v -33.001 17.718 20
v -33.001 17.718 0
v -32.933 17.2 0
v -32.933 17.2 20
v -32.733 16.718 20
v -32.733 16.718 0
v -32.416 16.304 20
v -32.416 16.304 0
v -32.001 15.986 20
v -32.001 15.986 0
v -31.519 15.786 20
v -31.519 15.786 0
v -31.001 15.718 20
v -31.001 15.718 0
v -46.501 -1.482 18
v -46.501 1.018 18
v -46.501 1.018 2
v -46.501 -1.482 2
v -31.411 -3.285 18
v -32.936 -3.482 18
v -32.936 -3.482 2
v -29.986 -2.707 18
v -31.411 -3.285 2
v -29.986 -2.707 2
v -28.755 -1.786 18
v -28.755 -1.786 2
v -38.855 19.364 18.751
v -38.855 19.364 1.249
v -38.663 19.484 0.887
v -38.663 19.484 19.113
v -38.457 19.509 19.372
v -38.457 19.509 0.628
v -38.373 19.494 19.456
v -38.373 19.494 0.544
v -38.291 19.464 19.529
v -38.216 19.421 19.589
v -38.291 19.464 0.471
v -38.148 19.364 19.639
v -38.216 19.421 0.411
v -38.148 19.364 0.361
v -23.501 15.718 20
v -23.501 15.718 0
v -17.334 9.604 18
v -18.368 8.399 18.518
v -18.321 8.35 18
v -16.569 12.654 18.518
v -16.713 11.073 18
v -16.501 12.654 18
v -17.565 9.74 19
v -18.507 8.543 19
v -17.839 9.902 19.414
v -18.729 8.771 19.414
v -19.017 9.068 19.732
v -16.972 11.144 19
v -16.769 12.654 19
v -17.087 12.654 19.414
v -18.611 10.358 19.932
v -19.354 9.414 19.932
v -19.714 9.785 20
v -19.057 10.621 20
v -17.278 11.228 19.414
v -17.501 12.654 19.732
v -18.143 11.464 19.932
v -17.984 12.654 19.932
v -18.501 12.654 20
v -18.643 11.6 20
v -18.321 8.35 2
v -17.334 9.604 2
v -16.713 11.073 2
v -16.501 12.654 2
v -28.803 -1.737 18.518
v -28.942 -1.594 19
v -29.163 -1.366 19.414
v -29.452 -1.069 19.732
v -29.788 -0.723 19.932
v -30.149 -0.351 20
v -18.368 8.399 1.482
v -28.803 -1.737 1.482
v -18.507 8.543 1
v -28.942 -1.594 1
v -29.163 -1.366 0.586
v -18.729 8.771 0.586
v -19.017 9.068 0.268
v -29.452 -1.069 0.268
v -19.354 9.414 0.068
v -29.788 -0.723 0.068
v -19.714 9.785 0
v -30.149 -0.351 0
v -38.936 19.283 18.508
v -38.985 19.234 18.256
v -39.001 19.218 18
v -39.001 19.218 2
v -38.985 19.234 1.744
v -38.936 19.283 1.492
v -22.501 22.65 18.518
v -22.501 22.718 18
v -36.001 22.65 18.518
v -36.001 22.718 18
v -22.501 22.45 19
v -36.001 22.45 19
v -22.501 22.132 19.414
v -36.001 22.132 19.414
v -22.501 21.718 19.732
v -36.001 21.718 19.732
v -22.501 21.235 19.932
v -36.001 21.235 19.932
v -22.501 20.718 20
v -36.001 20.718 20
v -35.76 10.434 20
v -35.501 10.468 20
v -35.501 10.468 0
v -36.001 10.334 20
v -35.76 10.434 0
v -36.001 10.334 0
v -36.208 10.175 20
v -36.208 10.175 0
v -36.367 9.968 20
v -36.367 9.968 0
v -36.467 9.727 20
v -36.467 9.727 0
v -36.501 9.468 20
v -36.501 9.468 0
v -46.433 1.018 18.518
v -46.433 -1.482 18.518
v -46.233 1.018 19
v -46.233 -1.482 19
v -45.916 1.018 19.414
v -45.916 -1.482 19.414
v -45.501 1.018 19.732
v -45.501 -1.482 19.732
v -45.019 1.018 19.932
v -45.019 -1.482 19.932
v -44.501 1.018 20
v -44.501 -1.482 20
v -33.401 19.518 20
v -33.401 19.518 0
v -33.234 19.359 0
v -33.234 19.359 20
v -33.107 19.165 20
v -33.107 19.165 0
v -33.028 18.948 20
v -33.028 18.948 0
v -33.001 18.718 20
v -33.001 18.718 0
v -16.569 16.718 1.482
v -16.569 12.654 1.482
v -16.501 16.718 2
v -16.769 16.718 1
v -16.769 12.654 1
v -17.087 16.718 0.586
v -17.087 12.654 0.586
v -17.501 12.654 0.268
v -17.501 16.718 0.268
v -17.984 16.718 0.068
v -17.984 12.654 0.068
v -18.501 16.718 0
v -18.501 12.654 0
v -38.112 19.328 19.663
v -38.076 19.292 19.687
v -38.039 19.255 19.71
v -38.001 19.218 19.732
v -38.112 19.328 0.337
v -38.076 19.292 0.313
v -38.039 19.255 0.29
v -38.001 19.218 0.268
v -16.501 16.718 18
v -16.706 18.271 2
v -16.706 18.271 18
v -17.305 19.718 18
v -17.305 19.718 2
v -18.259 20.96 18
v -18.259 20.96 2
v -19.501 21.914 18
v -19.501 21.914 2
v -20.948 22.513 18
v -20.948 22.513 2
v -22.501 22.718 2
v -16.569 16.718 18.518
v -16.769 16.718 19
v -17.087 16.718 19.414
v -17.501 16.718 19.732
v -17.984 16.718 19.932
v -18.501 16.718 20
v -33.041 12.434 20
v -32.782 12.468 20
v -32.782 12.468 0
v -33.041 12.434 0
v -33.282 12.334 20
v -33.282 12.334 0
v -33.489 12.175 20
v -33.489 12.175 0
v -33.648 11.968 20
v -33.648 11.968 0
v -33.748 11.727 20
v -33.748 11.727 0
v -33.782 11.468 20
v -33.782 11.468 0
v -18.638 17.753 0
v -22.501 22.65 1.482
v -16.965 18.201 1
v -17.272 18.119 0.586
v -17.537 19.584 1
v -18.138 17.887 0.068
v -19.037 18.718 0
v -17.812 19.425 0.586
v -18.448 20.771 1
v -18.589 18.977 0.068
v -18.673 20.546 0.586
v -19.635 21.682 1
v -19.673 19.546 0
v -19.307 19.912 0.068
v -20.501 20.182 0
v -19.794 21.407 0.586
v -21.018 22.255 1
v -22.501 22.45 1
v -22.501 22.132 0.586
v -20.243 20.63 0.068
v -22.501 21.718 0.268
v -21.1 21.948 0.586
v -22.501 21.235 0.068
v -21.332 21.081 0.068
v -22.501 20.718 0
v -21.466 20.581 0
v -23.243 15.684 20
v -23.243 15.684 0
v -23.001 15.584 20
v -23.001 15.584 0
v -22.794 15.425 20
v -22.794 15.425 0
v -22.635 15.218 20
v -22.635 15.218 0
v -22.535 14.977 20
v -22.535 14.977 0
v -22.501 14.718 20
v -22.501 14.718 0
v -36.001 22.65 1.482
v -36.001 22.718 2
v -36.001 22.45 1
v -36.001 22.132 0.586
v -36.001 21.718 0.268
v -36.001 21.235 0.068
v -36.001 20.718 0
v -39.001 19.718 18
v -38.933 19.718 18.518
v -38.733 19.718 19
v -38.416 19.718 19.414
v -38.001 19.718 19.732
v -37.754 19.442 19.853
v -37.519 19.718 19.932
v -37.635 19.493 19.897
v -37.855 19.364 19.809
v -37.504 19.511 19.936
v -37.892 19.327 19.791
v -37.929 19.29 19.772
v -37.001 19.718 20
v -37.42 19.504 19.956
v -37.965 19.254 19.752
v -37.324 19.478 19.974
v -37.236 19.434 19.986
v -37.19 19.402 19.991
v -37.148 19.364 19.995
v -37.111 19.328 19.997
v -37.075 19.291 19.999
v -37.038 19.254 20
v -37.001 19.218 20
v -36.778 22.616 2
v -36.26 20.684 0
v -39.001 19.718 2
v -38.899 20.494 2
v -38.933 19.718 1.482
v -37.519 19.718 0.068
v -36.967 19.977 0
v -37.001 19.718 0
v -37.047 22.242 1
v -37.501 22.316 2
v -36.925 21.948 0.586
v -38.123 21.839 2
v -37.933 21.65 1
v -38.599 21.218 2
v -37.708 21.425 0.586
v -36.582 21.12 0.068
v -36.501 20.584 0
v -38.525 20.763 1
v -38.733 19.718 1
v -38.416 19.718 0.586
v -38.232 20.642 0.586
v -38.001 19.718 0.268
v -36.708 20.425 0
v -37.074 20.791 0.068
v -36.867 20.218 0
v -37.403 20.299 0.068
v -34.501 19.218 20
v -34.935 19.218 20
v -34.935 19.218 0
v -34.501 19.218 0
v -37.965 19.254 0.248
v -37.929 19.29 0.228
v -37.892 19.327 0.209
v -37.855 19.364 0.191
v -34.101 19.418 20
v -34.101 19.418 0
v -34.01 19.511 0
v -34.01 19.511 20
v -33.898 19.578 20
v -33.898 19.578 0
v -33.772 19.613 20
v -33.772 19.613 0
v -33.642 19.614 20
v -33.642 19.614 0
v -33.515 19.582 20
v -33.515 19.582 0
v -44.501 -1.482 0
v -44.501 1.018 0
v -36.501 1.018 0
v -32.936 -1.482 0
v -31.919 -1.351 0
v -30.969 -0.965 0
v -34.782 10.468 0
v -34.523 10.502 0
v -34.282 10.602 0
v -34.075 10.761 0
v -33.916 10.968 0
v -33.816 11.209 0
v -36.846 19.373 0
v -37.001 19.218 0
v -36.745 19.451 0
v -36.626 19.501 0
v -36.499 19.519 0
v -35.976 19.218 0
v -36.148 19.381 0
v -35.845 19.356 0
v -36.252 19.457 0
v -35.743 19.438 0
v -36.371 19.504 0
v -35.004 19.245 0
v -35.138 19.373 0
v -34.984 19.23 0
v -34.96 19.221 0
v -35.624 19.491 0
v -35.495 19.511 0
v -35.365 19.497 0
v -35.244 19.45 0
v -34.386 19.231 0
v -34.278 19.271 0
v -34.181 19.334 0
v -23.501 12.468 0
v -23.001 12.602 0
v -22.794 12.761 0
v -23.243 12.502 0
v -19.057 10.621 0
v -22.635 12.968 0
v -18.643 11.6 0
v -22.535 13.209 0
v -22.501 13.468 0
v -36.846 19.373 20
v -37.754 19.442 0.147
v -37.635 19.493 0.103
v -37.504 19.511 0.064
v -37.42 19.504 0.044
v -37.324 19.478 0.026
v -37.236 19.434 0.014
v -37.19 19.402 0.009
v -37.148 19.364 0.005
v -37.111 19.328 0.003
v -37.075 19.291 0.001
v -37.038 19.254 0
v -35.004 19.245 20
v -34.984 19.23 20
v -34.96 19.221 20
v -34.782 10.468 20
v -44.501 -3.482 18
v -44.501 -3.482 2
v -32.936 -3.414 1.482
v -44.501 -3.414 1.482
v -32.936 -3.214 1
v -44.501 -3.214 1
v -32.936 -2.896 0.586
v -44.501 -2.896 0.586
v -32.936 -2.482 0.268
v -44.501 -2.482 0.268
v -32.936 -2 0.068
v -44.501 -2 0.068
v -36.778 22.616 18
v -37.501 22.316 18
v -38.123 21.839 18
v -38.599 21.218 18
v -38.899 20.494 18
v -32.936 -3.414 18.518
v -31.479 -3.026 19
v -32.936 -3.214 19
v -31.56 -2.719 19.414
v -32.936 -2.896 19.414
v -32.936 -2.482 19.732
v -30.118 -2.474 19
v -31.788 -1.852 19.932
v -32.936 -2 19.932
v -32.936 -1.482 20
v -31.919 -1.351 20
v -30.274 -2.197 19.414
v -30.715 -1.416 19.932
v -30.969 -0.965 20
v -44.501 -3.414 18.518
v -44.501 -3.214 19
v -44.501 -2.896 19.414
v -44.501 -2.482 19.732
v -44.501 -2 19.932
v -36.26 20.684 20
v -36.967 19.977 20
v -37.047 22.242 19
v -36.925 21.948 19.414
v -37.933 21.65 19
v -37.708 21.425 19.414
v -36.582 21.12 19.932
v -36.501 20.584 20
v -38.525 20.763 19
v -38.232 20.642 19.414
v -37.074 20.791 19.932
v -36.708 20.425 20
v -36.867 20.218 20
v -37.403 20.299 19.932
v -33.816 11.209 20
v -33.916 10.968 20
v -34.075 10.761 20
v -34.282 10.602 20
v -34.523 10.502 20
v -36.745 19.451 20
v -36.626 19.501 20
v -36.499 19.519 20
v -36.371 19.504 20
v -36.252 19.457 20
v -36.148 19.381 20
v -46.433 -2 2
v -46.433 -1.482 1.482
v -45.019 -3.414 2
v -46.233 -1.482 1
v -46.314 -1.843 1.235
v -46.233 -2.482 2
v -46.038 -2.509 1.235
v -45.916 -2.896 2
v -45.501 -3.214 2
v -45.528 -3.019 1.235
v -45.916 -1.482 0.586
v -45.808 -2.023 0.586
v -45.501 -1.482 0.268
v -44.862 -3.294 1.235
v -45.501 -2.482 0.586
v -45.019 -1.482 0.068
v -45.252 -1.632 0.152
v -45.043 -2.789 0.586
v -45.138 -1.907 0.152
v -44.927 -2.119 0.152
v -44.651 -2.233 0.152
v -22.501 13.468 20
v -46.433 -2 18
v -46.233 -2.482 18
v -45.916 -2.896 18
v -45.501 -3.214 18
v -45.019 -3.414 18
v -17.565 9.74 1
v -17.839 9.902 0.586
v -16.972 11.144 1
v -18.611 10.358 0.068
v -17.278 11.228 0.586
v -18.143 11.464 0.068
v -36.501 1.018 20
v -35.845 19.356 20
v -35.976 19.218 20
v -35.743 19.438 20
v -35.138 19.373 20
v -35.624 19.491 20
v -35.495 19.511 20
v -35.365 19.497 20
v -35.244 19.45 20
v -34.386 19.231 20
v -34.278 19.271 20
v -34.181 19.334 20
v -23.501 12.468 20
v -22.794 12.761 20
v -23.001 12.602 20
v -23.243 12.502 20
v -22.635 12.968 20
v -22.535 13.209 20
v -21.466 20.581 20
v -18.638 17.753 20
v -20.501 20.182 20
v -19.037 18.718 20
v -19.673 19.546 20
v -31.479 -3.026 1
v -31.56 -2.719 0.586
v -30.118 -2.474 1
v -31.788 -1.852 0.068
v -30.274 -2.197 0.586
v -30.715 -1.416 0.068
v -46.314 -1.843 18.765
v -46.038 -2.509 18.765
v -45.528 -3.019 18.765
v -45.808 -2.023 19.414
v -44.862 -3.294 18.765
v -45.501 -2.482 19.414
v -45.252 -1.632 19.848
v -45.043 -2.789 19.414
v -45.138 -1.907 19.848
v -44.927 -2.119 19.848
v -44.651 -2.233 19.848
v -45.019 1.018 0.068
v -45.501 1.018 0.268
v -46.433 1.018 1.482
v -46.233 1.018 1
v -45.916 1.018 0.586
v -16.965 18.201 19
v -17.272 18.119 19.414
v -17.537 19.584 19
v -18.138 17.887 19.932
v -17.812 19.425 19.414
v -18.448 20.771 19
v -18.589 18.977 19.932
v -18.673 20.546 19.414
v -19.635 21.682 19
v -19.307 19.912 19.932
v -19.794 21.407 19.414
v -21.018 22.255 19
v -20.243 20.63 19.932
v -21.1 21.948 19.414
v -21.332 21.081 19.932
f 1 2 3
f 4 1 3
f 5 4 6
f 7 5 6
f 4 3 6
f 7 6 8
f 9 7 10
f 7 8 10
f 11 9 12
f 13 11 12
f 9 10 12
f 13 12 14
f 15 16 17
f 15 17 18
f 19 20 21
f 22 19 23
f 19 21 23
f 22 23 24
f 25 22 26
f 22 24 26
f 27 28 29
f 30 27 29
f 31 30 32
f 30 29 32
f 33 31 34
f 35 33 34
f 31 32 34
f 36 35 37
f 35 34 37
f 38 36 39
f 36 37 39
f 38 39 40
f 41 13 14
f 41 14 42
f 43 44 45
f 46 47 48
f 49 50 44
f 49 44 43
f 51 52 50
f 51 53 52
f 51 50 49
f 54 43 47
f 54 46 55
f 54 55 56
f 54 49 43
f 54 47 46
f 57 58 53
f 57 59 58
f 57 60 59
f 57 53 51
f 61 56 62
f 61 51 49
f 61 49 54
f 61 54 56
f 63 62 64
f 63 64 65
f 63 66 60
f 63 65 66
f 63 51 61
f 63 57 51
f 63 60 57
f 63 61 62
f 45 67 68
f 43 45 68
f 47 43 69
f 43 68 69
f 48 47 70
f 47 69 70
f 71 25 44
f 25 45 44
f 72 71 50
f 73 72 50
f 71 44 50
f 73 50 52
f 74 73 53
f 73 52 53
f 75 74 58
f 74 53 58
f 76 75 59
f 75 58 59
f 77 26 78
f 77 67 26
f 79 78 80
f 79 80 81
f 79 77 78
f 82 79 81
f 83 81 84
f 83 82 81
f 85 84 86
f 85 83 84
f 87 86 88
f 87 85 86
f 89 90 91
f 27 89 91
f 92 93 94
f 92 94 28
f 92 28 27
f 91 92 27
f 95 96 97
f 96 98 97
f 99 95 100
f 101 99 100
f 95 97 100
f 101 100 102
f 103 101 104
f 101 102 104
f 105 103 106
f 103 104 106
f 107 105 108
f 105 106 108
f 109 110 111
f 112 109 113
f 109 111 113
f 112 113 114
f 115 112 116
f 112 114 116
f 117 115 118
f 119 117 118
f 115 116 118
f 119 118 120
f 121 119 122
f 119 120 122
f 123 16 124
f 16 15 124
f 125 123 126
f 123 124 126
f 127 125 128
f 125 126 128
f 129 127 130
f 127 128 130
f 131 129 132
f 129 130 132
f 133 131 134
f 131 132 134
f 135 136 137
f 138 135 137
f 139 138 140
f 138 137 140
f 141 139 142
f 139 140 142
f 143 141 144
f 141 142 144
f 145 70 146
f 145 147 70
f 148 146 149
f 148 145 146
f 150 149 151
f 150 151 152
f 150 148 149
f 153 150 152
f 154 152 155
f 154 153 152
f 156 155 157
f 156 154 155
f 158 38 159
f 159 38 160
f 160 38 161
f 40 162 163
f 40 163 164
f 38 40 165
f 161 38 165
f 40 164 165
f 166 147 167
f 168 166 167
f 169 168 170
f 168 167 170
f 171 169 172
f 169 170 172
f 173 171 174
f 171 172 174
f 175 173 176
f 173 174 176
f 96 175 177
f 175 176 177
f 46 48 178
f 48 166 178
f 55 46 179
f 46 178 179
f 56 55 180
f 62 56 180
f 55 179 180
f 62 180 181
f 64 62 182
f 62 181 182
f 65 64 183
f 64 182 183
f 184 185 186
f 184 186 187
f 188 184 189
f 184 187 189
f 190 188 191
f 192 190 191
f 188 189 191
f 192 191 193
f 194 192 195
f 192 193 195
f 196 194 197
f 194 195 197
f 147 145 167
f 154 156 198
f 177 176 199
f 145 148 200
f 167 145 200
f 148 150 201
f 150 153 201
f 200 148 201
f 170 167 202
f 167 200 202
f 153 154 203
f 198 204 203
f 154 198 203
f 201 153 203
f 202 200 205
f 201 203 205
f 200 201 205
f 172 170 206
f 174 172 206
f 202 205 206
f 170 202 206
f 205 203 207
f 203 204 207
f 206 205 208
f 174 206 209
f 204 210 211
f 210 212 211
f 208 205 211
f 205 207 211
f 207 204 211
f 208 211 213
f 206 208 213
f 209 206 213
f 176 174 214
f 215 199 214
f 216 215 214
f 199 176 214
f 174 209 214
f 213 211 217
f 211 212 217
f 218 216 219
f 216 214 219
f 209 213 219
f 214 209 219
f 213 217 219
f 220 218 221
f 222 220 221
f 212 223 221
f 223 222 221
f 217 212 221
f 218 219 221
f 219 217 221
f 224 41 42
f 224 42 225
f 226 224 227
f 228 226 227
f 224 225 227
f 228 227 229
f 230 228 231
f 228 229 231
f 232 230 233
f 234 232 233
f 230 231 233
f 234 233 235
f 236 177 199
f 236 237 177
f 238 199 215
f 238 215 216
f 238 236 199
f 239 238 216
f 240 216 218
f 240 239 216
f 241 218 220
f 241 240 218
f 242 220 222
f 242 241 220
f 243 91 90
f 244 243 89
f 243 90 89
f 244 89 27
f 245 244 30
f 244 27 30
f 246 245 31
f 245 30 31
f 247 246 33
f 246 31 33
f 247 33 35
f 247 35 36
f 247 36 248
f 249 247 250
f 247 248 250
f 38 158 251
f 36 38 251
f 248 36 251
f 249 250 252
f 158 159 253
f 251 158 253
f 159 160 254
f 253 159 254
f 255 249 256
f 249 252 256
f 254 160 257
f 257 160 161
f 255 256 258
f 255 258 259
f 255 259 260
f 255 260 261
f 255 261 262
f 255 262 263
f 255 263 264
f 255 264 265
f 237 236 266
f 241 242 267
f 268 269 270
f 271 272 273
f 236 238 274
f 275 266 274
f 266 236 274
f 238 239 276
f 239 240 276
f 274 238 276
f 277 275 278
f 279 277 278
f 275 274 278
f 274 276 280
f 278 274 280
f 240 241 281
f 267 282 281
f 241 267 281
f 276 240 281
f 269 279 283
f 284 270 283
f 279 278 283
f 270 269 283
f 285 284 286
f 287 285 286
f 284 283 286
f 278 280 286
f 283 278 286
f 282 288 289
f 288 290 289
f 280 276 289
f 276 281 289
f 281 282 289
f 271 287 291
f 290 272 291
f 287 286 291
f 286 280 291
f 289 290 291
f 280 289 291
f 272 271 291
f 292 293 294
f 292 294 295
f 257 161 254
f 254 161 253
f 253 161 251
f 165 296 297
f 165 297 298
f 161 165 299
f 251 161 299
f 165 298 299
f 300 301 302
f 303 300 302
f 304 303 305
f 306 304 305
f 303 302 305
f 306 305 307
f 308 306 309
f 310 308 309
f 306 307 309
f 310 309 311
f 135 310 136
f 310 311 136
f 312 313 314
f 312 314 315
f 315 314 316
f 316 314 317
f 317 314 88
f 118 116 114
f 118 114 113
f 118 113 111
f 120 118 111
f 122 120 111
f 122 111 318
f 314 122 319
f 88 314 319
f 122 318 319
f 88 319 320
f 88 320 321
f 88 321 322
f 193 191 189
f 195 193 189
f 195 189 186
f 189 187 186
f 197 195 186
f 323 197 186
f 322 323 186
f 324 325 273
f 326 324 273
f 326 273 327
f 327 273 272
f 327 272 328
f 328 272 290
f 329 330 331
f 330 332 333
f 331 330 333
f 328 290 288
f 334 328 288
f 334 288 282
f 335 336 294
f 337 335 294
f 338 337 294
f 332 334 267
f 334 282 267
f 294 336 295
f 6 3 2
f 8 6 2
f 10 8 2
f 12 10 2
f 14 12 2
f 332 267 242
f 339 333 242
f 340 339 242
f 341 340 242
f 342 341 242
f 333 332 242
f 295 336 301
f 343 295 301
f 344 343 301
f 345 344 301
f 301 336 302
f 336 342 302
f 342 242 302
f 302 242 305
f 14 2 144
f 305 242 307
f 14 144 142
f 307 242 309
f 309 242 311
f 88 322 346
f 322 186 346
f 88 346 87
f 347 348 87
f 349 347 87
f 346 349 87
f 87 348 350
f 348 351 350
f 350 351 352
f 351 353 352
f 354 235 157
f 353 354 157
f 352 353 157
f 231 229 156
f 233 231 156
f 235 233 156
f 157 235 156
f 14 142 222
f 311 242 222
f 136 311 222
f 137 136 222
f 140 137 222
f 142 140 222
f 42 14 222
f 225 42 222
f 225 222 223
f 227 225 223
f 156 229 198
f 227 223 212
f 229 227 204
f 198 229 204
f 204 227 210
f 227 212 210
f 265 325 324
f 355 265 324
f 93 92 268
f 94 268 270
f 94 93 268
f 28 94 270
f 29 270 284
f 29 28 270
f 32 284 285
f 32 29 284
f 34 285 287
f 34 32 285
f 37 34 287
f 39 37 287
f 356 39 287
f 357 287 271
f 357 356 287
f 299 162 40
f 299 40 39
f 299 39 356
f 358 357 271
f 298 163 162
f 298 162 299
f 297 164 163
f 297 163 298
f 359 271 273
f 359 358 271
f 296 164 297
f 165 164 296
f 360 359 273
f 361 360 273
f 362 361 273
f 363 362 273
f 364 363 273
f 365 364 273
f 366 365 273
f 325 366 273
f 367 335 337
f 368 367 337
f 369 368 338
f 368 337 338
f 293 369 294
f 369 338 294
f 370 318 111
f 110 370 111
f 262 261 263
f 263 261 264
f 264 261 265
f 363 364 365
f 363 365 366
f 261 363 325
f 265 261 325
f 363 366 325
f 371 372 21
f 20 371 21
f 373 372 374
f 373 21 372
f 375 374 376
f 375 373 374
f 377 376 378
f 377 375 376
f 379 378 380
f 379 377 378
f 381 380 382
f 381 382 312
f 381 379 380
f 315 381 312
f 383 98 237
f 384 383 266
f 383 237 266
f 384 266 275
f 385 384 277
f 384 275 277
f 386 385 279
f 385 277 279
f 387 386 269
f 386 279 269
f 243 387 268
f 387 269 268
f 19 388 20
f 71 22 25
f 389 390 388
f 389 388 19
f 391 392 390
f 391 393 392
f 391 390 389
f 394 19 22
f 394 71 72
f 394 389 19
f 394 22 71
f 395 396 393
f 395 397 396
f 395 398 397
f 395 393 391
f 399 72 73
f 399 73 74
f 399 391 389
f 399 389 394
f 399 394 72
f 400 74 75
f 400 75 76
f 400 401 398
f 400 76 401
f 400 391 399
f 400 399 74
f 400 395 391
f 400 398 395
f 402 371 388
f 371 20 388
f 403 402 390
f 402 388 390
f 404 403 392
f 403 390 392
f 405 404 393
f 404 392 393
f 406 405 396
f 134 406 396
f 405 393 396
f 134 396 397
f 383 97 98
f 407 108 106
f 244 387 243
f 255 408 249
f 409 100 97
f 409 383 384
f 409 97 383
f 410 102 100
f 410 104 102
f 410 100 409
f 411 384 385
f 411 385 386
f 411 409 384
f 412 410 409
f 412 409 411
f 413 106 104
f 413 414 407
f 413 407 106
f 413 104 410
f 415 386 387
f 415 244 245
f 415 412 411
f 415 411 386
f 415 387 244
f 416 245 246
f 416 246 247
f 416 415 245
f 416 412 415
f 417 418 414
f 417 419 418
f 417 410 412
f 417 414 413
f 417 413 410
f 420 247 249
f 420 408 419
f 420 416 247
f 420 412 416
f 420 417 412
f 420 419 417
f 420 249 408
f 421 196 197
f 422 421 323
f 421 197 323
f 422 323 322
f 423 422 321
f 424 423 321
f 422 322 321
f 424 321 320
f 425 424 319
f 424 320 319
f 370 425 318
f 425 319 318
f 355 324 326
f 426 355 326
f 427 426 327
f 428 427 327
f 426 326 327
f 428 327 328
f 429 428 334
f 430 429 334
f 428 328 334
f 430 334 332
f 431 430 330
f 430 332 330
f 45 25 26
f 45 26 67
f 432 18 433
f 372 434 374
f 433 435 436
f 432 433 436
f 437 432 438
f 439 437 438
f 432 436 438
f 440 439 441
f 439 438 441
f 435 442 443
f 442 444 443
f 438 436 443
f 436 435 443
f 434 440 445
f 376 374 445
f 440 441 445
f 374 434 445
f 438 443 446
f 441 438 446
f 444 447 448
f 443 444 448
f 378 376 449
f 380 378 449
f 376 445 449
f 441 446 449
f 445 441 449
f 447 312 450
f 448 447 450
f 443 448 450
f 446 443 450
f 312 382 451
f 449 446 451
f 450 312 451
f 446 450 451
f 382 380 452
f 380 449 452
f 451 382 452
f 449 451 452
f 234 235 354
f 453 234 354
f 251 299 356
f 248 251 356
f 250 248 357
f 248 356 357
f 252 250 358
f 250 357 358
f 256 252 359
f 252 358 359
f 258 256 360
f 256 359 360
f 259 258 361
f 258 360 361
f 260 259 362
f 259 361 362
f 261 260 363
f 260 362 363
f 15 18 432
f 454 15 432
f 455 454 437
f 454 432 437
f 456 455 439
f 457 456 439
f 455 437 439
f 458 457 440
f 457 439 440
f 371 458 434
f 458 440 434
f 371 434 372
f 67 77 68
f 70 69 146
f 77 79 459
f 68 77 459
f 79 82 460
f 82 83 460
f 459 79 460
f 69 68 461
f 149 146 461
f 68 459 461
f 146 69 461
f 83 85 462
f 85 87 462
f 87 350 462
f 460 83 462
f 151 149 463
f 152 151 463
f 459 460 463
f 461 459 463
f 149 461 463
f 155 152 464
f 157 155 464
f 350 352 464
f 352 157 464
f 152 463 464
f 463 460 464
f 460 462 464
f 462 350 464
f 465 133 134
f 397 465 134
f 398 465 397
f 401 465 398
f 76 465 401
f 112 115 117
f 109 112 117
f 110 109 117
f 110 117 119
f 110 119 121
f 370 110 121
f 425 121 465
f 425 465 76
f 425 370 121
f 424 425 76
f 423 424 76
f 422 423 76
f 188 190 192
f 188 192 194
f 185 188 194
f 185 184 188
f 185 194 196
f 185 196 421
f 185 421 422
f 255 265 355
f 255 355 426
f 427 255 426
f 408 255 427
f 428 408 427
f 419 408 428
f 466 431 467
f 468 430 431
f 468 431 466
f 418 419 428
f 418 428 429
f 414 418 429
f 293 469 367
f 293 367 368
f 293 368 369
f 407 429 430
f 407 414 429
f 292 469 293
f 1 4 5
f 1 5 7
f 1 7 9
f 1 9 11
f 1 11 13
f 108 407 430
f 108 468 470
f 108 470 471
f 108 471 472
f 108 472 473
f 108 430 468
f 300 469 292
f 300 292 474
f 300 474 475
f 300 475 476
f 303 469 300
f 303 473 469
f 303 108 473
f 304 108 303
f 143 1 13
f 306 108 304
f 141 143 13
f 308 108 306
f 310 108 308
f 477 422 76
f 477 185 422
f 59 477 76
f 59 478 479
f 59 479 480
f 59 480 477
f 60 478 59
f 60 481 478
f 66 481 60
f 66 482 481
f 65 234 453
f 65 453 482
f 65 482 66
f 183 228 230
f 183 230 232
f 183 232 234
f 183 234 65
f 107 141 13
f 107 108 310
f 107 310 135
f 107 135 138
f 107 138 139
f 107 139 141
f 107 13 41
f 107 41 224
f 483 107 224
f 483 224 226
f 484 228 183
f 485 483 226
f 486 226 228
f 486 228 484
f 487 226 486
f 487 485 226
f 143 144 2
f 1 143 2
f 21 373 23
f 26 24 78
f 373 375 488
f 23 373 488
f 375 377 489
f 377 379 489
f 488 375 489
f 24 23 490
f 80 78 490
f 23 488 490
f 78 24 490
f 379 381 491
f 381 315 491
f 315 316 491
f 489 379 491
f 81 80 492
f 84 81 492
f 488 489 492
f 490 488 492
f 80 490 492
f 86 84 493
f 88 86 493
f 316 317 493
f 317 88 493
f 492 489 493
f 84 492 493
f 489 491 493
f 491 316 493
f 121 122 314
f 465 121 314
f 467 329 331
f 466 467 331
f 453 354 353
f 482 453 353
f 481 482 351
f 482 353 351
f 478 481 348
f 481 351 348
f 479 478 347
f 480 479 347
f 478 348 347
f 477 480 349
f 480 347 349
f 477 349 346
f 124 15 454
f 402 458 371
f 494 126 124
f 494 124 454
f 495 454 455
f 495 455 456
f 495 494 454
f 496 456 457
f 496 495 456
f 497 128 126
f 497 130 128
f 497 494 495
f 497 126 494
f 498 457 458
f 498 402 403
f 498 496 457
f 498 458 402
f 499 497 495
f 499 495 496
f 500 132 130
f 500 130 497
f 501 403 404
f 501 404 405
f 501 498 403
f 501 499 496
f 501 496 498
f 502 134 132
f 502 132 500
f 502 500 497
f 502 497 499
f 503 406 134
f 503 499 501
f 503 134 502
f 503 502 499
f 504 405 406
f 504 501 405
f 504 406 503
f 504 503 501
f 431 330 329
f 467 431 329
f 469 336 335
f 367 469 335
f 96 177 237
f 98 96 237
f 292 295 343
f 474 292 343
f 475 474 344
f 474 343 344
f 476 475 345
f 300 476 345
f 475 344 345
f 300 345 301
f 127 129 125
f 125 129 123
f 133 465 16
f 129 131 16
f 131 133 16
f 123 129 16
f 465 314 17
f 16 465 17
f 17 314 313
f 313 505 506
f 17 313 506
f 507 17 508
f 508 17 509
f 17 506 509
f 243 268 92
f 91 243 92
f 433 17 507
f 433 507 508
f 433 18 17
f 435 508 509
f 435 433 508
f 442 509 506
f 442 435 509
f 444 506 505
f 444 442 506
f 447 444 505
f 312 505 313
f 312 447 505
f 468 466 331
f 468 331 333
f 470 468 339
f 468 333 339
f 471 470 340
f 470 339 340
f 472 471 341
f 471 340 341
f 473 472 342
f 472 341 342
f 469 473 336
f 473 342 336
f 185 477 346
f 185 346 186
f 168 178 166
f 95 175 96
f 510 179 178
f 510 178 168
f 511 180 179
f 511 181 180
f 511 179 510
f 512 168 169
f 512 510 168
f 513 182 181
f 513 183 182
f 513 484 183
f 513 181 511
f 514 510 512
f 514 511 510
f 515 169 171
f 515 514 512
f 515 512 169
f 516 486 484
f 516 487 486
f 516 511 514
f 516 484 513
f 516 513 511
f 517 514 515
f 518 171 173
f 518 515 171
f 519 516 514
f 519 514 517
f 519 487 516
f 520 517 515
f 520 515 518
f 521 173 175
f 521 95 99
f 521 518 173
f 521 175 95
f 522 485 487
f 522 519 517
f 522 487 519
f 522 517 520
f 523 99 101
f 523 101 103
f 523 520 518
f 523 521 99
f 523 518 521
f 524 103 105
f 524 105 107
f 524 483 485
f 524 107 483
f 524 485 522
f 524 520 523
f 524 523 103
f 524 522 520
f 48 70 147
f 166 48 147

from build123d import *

# Parameters (mm, degrees)
F1_DEPTH = 20
F2_R     = 2


# Not quite as in the source:
# - a feature names something its author has since deleted; it is built from what else it names


with BuildPart() as f1:
    # F0 (on Top) → F1 (new body)
    with BuildSketch(Plane.XY):
        with BuildLine():
            ThreePointArc((-33.4013422072, 19.5177844279), (-33.1069150162, 19.1649980234), (-33.0013422072, 18.7177844279))
            Line((-33.0013422072, 18.7177844279), (-33.0013422072, 17.7177844279))
            ThreePointArc((-33.0013422072, 17.7177844279), (-32.4155557696, 16.3035708655), (-31.0013422072, 15.7177844279))
            Line((-31.0013422072, 15.7177844279), (-23.5013422072, 15.7177844279))
            ThreePointArc((-23.5013422072, 15.7177844279), (-22.794235426, 15.424891209), (-22.5013422072, 14.7177844279))
            Line((-22.5013422072, 14.7177844279), (-22.5013422072, 13.4677844279))
            ThreePointArc((-22.5013422072, 13.4677844279), (-22.794235426, 12.7606776467), (-23.5013422072, 12.4677844279))
            Line((-23.5013422072, 12.4677844279), (-32.781970528, 12.4677844279))
            ThreePointArc((-32.781970528, 12.4677844279), (-33.4890773091, 12.174891209), (-33.781970528, 11.4677844279))
            ThreePointArc((-33.781970528, 11.4677844279), (-34.0748637468, 10.7606776467), (-34.781970528, 10.4677844279))
            Line((-34.781970528, 10.4677844279), (-35.5013422072, 10.4677844279))
            ThreePointArc((-35.5013422072, 10.4677844279), (-36.2084489884, 10.174891209), (-36.5013422072, 9.4677844279))
            Line((-36.5013422072, 9.4677844279), (-36.5013422072, 2.9677844279))
            Line((-36.5013422072, 2.9677844279), (-36.5013422072, 1.0177844279))
            Line((-36.5013422072, 1.0177844279), (-38.5013422072, 1.0177844279))
            Line((-38.5013422072, 1.0177844279), (-46.5013422072, 1.0177844279))
            Line((-46.5013422072, 1.0177844279), (-46.5013422072, 0.5177844279))
            Line((-46.5013422072, 0.5177844279), (-46.5013422072, -1.4822155721))
            ThreePointArc((-46.5013422072, -1.4822155721), (-45.9155557696, -2.8964291345), (-44.5013422072, -3.4822155721))
            Line((-44.5013422072, -3.4822155721), (-32.935840724, -3.4822155721))
            ThreePointArc((-32.935840724, -3.4822155721), (-30.679965917, -3.0419843493), (-28.7551266184, -1.7858918573))
            Line((-28.7551266184, -1.7858918573), (-18.3206281016, 8.3504781304))
            ThreePointArc((-18.3206281016, 8.3504781304), (-16.9748476295, 10.3179485849), (-16.5013422072, 12.6541544156))
            Line((-16.5013422072, 12.6541544156), (-16.5013422072, 16.7177844279))
            ThreePointArc((-16.5013422072, 16.7177844279), (-18.2587015201, 20.960425115), (-22.5013422072, 22.7177844279))
            Line((-22.5013422072, 22.7177844279), (-36.0013422072, 22.7177844279))
            ThreePointArc((-36.0013422072, 22.7177844279), (-38.1226625508, 21.8391047714), (-39.0013422072, 19.7177844279))
            Line((-39.0013422072, 19.7177844279), (-39.0013422072, 19.2177844279))
            Line((-39.0013422072, 19.2177844279), (-38.8548955978, 19.3642310373))
            ThreePointArc((-38.8548955978, 19.3642310373), (-38.5013422072, 19.5106776467), (-38.1477888166, 19.3642310373))
            Line((-38.1477888166, 19.3642310373), (-38.0013422072, 19.2177844279))
            Line((-38.0013422072, 19.2177844279), (-37.8548955978, 19.3642310373))
            ThreePointArc((-37.8548955978, 19.3642310373), (-37.5013422072, 19.5106776467), (-37.1477888166, 19.3642310373))
            Line((-37.1477888166, 19.3642310373), (-37.0013422072, 19.2177844279))
            Line((-37.0013422072, 19.2177844279), (-36.8463774903, 19.3727491447))
            ThreePointArc((-36.8463774903, 19.3727491447), (-36.498920301, 19.5191585891), (-36.1479965135, 19.3812647196))
            Line((-36.1479965135, 19.3812647196), (-35.9763422072, 19.2177844279))
            Line((-35.9763422072, 19.2177844279), (-35.8449793172, 19.3557154623))
            ThreePointArc((-35.8449793172, 19.3557154623), (-35.4951018479, 19.5107392214), (-35.1380827655, 19.3729568416))
            Line((-35.1380827655, 19.3729568416), (-35.0041172482, 19.2453706347))
            ThreePointArc((-35.0041172482, 19.2453706347), (-34.9722907986, 19.2249367588), (-34.935151731, 19.2177844279))
            Line((-34.935151731, 19.2177844279), (-34.5013422072, 19.2177844279))
            ThreePointArc((-34.5013422072, 19.2177844279), (-34.2777354094, 19.2705708324), (-34.1013422072, 19.4177844279))
            ThreePointArc((-34.1013422072, 19.4177844279), (-33.7720528853, 19.6127591747), (-33.4013422072, 19.5177844279))
        make_face()
    extrude(amount=F1_DEPTH)

    # F2
    f2_edges = [f1.edges().sort_by_distance(p)[0] for p in [
        (-29.251342, 22.717784, 20),
        (-29.251342, 22.717784, 0),
    ]]
    fillet(f2_edges, radius=F2_R)


solid = f1.part
